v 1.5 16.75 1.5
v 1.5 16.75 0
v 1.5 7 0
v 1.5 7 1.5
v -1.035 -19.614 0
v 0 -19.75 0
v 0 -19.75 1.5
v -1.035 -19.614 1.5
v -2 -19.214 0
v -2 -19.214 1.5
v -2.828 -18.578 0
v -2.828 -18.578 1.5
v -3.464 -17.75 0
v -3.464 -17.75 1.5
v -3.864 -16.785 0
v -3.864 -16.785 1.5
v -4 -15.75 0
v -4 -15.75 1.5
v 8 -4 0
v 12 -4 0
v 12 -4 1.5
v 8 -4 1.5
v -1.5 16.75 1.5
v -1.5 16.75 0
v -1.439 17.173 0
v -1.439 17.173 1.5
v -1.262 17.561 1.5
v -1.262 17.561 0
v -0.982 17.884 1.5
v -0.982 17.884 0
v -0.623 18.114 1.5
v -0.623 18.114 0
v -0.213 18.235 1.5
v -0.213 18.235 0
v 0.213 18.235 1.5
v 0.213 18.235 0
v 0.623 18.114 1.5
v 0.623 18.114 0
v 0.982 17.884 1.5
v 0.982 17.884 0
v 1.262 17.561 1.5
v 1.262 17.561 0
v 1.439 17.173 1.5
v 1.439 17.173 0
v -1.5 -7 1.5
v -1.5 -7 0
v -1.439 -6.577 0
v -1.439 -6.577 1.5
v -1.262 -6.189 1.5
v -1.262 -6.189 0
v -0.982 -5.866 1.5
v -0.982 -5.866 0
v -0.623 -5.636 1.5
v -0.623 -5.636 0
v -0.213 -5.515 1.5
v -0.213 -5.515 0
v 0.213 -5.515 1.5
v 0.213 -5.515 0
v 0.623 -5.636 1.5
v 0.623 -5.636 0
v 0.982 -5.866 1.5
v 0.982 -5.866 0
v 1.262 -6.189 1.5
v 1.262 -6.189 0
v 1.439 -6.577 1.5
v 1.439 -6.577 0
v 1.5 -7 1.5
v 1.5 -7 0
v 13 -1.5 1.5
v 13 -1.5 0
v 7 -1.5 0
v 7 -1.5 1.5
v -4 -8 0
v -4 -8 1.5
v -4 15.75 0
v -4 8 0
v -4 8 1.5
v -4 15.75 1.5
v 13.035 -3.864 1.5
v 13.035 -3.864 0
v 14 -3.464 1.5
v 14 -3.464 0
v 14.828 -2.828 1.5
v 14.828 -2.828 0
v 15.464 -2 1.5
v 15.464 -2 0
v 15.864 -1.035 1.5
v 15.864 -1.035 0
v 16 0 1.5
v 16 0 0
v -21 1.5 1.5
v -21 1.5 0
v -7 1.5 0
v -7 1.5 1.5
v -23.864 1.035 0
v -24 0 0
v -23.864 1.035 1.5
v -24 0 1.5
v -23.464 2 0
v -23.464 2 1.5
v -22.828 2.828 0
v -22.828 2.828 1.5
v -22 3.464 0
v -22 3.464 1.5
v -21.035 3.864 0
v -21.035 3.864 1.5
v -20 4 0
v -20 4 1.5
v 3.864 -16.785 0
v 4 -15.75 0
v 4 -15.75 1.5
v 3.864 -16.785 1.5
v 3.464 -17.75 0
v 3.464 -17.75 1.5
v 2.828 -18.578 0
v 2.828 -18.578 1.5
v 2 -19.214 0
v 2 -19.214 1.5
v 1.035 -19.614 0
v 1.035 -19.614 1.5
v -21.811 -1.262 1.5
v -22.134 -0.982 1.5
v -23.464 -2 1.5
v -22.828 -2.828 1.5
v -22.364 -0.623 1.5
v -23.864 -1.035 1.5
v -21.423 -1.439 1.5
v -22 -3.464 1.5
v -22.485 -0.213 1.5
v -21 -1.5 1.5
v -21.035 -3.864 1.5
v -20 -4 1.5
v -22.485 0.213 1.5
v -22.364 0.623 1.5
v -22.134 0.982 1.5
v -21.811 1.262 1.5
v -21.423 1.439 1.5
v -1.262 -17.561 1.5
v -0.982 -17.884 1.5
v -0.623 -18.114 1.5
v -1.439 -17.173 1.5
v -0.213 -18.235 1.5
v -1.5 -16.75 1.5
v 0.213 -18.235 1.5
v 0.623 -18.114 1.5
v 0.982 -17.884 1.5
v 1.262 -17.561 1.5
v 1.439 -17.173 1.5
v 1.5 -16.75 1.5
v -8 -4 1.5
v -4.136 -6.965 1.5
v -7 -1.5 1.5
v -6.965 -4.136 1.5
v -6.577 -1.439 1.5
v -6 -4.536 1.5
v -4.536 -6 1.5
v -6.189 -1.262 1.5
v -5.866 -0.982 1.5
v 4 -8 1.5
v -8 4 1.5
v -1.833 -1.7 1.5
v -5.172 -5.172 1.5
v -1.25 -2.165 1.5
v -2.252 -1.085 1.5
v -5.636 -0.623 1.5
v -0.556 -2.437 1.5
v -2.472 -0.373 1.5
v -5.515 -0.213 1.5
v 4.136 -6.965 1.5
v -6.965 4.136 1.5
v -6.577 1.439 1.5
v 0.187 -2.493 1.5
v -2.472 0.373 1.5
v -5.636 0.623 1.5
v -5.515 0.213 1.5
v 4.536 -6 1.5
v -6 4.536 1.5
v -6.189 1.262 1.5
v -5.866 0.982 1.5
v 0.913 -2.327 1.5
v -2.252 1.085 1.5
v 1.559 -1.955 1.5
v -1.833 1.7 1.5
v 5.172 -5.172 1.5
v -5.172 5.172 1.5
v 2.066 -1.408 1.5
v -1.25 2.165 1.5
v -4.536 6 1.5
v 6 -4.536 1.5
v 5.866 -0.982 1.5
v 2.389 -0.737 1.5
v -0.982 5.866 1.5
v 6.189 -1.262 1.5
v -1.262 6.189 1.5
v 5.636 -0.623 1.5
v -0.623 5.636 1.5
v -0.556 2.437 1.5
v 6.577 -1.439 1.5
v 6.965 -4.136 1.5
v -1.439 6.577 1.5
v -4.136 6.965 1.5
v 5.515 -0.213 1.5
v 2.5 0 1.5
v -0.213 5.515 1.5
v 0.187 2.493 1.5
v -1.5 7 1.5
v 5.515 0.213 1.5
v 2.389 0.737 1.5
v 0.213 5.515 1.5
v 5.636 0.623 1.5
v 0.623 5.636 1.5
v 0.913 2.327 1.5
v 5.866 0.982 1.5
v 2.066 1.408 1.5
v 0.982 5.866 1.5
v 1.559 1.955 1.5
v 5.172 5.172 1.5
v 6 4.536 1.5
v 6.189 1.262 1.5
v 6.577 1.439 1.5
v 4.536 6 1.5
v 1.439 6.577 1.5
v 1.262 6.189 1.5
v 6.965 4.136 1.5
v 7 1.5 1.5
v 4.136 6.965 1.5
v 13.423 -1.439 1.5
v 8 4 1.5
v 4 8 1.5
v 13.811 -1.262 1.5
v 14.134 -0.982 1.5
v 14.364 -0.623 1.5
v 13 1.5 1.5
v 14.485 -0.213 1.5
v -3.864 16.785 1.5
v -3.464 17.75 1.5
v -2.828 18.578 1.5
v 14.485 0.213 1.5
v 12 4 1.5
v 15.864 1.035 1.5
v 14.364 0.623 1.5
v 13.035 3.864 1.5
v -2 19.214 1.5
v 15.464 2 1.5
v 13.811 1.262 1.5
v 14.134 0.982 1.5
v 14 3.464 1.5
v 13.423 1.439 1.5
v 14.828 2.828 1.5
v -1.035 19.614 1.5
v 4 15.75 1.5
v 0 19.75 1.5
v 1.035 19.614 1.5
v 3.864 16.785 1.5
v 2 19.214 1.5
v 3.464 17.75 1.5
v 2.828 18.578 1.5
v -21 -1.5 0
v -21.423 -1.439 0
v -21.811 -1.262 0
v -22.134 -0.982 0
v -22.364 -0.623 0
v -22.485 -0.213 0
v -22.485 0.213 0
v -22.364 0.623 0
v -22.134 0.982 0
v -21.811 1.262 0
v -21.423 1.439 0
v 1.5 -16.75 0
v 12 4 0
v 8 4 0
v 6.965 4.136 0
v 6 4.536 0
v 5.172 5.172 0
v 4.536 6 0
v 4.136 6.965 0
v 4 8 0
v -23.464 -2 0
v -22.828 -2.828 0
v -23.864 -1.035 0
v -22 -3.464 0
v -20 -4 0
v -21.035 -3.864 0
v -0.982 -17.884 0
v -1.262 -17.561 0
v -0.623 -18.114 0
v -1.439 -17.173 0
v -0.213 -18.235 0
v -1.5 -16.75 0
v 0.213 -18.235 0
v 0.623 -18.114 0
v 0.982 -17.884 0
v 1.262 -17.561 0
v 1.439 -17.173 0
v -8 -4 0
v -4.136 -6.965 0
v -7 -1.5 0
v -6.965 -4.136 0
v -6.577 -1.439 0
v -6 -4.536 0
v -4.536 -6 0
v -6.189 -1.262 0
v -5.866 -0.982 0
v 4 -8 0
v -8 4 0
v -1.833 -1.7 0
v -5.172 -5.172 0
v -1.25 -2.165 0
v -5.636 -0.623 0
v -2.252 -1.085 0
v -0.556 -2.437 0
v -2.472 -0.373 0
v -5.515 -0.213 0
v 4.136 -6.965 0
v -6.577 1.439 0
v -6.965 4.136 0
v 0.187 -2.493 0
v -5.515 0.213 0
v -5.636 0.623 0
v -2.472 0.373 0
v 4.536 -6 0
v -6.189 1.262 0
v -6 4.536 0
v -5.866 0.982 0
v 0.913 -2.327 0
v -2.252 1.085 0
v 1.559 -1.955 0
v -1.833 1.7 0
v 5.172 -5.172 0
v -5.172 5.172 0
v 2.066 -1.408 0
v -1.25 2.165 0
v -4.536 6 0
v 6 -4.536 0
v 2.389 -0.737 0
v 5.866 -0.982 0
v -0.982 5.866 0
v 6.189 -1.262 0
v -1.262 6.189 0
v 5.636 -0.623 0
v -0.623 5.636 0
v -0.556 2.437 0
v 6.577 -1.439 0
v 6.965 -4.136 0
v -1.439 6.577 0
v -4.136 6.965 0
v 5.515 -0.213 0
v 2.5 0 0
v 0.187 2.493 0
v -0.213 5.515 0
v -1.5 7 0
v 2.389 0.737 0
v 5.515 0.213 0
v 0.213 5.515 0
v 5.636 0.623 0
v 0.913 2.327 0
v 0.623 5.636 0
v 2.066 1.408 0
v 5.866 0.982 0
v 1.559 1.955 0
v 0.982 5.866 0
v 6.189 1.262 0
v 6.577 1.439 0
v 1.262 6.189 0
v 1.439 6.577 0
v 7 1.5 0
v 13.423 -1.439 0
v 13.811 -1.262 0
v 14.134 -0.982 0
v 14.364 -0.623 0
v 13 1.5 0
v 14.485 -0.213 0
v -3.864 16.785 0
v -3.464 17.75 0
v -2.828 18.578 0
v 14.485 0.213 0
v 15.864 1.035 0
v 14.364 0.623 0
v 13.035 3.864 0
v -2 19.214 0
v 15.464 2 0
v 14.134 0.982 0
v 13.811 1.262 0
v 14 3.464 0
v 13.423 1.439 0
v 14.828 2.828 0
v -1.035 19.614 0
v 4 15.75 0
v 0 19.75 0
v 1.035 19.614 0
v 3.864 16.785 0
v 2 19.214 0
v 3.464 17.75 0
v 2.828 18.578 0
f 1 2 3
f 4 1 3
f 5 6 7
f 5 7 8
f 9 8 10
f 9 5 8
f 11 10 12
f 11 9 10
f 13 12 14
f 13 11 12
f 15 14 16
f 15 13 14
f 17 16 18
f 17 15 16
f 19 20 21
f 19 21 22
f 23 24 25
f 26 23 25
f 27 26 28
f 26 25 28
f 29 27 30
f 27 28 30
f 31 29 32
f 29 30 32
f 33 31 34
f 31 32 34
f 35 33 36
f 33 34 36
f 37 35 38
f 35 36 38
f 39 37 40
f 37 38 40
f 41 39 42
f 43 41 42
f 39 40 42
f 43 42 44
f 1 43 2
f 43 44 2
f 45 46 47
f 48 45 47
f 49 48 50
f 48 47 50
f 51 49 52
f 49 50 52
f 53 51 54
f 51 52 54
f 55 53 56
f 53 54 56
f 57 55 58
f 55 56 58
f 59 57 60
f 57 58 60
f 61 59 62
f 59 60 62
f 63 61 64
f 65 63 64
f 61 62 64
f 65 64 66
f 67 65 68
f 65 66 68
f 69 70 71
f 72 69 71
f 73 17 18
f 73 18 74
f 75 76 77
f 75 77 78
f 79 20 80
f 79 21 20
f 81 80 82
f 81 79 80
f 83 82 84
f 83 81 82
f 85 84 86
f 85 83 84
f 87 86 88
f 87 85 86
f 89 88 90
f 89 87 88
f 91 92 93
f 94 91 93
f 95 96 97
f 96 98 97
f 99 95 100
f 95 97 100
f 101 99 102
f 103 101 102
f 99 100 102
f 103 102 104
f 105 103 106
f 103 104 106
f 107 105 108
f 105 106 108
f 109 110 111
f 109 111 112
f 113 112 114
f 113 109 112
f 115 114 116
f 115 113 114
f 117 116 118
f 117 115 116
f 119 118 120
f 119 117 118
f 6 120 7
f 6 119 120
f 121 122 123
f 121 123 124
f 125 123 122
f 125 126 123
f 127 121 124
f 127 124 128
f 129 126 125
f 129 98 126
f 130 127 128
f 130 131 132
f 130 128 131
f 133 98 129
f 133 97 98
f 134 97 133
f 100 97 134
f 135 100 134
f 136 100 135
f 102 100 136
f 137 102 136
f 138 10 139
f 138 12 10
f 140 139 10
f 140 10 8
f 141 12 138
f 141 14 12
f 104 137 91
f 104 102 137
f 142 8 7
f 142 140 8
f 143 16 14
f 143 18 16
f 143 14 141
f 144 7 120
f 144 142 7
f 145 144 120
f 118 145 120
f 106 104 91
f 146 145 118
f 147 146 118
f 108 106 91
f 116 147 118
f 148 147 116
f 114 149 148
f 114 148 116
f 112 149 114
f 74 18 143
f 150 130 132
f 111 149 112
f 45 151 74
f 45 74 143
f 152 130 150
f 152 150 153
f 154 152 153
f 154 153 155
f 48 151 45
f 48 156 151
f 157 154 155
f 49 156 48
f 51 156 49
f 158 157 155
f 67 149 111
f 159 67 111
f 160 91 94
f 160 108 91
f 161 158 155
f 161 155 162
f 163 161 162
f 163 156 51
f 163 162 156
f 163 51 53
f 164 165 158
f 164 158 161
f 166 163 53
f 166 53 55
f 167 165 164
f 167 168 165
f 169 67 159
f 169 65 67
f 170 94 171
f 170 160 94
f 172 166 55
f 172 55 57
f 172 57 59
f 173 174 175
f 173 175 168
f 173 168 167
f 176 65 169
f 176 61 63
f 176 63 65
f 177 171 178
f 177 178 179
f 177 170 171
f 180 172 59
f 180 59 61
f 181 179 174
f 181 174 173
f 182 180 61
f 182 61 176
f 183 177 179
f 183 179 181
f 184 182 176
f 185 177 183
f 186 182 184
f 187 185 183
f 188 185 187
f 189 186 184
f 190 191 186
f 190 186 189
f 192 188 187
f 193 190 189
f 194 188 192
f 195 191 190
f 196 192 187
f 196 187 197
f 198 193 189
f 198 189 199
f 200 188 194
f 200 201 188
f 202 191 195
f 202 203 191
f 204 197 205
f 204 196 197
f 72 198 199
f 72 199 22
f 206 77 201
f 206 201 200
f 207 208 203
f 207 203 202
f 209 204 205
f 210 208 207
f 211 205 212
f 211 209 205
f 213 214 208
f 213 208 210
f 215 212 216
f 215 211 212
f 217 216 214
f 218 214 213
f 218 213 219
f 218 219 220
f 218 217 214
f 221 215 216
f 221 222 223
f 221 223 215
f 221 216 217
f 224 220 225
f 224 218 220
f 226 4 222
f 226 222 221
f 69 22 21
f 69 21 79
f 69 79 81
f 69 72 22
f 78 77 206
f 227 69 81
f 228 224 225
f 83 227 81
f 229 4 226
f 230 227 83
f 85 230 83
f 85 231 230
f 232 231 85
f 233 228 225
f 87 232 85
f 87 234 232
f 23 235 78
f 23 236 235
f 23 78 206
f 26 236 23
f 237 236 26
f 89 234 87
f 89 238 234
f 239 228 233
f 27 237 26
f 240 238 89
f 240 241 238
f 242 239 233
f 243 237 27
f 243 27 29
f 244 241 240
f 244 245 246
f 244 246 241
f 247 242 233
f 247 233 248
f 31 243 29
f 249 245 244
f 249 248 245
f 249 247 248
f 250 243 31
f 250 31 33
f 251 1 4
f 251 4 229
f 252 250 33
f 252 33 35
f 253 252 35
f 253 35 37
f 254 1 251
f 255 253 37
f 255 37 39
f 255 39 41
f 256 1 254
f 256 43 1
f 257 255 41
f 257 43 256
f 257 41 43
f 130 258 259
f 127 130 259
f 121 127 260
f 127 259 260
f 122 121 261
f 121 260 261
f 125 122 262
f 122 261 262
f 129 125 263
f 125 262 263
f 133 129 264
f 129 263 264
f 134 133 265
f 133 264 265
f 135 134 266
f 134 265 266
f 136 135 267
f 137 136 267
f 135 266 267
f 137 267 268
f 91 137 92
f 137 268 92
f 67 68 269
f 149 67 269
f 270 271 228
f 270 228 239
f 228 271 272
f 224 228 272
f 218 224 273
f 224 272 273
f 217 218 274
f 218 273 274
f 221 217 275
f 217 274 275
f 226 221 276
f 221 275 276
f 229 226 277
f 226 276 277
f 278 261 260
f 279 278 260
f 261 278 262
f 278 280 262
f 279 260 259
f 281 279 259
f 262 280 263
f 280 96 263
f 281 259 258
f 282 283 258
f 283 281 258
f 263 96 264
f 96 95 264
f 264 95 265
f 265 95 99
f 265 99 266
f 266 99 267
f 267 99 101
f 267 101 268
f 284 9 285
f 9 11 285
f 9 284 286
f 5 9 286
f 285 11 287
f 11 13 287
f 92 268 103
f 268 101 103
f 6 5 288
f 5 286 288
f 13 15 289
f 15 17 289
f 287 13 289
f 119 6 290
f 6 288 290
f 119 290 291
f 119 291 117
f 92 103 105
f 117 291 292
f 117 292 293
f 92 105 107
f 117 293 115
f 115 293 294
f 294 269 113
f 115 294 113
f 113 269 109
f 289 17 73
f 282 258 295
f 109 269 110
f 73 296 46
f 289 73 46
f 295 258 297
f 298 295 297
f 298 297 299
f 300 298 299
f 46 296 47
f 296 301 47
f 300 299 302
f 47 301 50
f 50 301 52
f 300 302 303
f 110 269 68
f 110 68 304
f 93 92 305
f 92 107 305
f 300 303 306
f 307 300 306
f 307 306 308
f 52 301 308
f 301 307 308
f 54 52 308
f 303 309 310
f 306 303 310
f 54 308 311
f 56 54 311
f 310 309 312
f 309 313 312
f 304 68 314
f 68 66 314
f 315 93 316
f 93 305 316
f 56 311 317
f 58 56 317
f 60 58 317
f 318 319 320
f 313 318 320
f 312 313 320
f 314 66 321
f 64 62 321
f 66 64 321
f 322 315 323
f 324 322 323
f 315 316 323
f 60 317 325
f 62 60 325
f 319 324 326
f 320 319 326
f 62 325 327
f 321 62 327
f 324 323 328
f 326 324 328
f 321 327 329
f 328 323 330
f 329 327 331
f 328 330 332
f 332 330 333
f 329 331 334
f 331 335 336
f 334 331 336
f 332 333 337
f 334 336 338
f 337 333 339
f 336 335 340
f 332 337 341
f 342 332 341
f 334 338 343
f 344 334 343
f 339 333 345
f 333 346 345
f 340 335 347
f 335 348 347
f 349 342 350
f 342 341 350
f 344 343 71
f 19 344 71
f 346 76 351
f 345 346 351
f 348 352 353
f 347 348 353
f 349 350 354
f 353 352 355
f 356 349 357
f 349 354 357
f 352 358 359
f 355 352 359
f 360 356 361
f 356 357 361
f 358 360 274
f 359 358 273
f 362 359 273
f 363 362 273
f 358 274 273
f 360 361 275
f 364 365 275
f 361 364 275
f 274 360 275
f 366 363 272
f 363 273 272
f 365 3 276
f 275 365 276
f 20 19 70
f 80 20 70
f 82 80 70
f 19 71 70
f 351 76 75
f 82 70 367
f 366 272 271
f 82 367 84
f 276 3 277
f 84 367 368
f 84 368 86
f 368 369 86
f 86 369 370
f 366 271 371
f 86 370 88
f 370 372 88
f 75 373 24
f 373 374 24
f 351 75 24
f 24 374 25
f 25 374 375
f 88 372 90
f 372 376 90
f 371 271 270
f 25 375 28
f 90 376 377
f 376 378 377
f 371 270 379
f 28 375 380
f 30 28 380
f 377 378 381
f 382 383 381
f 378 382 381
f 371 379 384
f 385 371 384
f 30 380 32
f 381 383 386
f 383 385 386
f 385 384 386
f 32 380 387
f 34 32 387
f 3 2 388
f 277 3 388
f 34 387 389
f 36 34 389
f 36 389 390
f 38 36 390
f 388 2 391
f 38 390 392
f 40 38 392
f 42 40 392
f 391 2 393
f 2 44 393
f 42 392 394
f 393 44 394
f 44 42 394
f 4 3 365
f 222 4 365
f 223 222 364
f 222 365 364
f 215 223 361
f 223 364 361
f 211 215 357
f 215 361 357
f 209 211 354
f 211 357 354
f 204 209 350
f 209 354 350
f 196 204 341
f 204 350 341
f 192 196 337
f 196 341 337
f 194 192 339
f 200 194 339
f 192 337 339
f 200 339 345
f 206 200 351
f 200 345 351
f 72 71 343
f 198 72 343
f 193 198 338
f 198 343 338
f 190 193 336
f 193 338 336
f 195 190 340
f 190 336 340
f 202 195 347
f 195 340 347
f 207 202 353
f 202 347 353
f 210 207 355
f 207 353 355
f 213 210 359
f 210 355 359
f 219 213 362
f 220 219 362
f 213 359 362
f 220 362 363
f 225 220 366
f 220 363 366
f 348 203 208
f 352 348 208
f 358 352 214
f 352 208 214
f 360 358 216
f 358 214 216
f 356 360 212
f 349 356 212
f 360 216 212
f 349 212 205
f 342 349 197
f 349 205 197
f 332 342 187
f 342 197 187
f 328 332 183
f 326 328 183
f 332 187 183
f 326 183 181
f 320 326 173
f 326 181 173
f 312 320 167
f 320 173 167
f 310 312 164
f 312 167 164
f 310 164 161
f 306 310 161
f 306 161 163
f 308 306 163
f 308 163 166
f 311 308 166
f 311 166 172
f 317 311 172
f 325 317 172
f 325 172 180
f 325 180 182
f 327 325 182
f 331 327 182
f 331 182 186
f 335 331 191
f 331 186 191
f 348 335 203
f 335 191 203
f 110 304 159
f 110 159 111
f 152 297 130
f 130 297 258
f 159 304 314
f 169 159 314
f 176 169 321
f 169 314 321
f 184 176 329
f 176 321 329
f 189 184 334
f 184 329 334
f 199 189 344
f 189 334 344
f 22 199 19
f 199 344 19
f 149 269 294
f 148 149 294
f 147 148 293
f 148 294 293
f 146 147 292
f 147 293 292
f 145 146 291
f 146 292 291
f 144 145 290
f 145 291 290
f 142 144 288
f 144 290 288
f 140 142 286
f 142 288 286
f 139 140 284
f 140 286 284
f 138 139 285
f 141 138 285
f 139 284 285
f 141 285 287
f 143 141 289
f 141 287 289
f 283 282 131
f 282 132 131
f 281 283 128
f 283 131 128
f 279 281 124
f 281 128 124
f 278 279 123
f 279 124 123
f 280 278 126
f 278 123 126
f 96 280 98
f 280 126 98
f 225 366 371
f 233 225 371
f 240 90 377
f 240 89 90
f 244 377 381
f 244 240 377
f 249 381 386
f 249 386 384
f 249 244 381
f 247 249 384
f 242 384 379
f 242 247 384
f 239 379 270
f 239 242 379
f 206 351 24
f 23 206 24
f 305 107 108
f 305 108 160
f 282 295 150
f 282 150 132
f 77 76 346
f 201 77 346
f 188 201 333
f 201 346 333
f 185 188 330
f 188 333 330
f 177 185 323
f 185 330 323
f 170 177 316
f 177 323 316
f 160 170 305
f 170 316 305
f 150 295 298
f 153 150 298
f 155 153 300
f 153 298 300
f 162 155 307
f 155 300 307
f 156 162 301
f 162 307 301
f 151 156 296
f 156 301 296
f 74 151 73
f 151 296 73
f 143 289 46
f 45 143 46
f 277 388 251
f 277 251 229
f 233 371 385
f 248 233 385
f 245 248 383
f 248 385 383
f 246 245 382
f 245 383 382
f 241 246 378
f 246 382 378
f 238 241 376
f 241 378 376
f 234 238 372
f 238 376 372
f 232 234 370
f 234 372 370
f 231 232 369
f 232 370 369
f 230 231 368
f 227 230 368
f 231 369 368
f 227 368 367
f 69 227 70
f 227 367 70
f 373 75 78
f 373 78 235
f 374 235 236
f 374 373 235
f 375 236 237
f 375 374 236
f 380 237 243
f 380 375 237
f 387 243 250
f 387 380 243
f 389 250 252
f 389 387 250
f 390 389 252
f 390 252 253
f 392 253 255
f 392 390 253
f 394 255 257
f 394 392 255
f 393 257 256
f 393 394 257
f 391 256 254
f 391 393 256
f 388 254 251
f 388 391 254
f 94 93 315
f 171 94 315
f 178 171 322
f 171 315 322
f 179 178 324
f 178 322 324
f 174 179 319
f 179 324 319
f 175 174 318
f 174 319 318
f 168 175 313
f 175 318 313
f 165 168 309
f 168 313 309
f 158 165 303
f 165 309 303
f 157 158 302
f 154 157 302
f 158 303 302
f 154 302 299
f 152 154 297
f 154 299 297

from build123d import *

# Parameters (mm, degrees)
EXTRUDE_2_DEPTH     = 1.5
FILLET_1_DEPTH      = 1.5
FILLET_1_2_DEPTH    = 1.5
SKETCH_3_R          = 2.5
CUT_EXTRUDE_2_DEPTH = 1.5
FILLET_2_R          = 4


with BuildPart() as part:
    # 草图1 → 凸台-拉伸2 (new body)
    with BuildSketch(Plane.XY):
        Polygon((-24, 4), (-4, 4), (-4, 19.75), (4, 19.75), (4, 4), (16, 4), (16, -4), (4, -4), (4, -19.75), (-4, -19.75), (-4, -4), (-24, -4), align=None)
        with BuildLine():
            Line((-21, 1.5), (-7, 1.5))
            ThreePointArc((-7, 1.5), (-5.5, 0), (-7, -1.5))
            Line((-7, -1.5), (-21, -1.5))
            ThreePointArc((-21, -1.5), (-22.5, 0), (-21, 1.5))
        make_face(mode=Mode.SUBTRACT)
        with BuildLine():
            Line((7, 1.5), (13, 1.5))
            ThreePointArc((13, 1.5), (14.5, 0), (13, -1.5))
            Line((13, -1.5), (7, -1.5))
            ThreePointArc((7, -1.5), (5.5, 0), (7, 1.5))
        make_face(mode=Mode.SUBTRACT)
        with BuildLine():
            Line((-1.5, -16.75), (-1.5, -7))
            ThreePointArc((-1.5, -7), (0, -5.5), (1.5, -7))
            Line((1.5, -7), (1.5, -16.75))
            ThreePointArc((1.5, -16.75), (0, -18.25), (-1.5, -16.75))
        make_face(mode=Mode.SUBTRACT)
        with BuildLine():
            Line((1.5, 16.75), (1.5, 7))
            ThreePointArc((1.5, 7), (0, 5.5), (-1.5, 7))
            Line((-1.5, 7), (-1.5, 16.75))
            ThreePointArc((-1.5, 16.75), (0, 18.25), (1.5, 16.75))
        make_face(mode=Mode.SUBTRACT)
    extrude(amount=EXTRUDE_2_DEPTH)

    # 圆角1: read off the stored shape, not the designer's step
    # 圆角1 outline → 圆角1 (cut)
    with BuildSketch(Plane.XY):
        with BuildLine():
            ThreePointArc((4, -15.75), (2.828427125, -18.578427125), (0, -19.75))
            Line((0, -19.75), (4, -19.75))
            Line((4, -19.75), (4, -15.75))
        make_face()
        with BuildLine():
            ThreePointArc((0, -19.75), (-2.828427125, -18.578427125), (-4, -15.75))
            Line((-4, -15.75), (-4, -19.75))
            Line((-4, -19.75), (0, -19.75))
        make_face()
        with BuildLine():
            ThreePointArc((-4, 15.75), (-2.828427125, 18.578427125), (0, 19.75))
            Line((0, 19.75), (-4, 19.75))
            Line((-4, 19.75), (-4, 15.75))
        make_face()
        with BuildLine():
            ThreePointArc((0, 19.75), (2.828427125, 18.578427125), (4, 15.75))
            Line((4, 15.75), (4, 19.75))
            Line((4, 19.75), (0, 19.75))
        make_face()
    extrude(amount=FILLET_1_DEPTH, mode=Mode.SUBTRACT)

    # Fillet 1 2 outline → Fillet 1 2 (add)
    with BuildSketch(Plane.XY):
        with BuildLine():
            Line((4, -4), (4, -8))
            ThreePointArc((4, -8), (5.171572875, -5.171572875), (8, -4))
            Line((8, -4), (4, -4))
        make_face()
        with BuildLine():
            ThreePointArc((-8, -4), (-5.171572875, -5.171572875), (-4, -8))
            Line((-4, -8), (-4, -4))
            Line((-4, -4), (-8, -4))
        make_face()
        with BuildLine():
            Line((-4, 4), (-4, 8))
            ThreePointArc((-4, 8), (-5.171572875, 5.171572875), (-8, 4))
            Line((-8, 4), (-4, 4))
        make_face()
        with BuildLine():
            ThreePointArc((8, 4), (5.171572875, 5.171572875), (4, 8))
            Line((4, 8), (4, 4))
            Line((4, 4), (8, 4))
        make_face()
    extrude(amount=FILLET_1_2_DEPTH)

    # 草图3 → 切除-拉伸2 (cut)
    with BuildSketch(Plane.XY.offset(1.5)):
        Circle(SKETCH_3_R)
    extrude(amount=-CUT_EXTRUDE_2_DEPTH, mode=Mode.SUBTRACT)

    # 圆角2
    fillet_2_edges = [part.edges().sort_by_distance(p)[0] for p in [
        (-24, -4, 0.75),
        (-24, 4, 0.75),
        (16, -4, 0.75),
        (16, 4, 0.75),
    ]]
    fillet(fillet_2_edges, radius=FILLET_2_R - 0.0001)  # a hair under: the kernel refuses the full size


solid = part.part
